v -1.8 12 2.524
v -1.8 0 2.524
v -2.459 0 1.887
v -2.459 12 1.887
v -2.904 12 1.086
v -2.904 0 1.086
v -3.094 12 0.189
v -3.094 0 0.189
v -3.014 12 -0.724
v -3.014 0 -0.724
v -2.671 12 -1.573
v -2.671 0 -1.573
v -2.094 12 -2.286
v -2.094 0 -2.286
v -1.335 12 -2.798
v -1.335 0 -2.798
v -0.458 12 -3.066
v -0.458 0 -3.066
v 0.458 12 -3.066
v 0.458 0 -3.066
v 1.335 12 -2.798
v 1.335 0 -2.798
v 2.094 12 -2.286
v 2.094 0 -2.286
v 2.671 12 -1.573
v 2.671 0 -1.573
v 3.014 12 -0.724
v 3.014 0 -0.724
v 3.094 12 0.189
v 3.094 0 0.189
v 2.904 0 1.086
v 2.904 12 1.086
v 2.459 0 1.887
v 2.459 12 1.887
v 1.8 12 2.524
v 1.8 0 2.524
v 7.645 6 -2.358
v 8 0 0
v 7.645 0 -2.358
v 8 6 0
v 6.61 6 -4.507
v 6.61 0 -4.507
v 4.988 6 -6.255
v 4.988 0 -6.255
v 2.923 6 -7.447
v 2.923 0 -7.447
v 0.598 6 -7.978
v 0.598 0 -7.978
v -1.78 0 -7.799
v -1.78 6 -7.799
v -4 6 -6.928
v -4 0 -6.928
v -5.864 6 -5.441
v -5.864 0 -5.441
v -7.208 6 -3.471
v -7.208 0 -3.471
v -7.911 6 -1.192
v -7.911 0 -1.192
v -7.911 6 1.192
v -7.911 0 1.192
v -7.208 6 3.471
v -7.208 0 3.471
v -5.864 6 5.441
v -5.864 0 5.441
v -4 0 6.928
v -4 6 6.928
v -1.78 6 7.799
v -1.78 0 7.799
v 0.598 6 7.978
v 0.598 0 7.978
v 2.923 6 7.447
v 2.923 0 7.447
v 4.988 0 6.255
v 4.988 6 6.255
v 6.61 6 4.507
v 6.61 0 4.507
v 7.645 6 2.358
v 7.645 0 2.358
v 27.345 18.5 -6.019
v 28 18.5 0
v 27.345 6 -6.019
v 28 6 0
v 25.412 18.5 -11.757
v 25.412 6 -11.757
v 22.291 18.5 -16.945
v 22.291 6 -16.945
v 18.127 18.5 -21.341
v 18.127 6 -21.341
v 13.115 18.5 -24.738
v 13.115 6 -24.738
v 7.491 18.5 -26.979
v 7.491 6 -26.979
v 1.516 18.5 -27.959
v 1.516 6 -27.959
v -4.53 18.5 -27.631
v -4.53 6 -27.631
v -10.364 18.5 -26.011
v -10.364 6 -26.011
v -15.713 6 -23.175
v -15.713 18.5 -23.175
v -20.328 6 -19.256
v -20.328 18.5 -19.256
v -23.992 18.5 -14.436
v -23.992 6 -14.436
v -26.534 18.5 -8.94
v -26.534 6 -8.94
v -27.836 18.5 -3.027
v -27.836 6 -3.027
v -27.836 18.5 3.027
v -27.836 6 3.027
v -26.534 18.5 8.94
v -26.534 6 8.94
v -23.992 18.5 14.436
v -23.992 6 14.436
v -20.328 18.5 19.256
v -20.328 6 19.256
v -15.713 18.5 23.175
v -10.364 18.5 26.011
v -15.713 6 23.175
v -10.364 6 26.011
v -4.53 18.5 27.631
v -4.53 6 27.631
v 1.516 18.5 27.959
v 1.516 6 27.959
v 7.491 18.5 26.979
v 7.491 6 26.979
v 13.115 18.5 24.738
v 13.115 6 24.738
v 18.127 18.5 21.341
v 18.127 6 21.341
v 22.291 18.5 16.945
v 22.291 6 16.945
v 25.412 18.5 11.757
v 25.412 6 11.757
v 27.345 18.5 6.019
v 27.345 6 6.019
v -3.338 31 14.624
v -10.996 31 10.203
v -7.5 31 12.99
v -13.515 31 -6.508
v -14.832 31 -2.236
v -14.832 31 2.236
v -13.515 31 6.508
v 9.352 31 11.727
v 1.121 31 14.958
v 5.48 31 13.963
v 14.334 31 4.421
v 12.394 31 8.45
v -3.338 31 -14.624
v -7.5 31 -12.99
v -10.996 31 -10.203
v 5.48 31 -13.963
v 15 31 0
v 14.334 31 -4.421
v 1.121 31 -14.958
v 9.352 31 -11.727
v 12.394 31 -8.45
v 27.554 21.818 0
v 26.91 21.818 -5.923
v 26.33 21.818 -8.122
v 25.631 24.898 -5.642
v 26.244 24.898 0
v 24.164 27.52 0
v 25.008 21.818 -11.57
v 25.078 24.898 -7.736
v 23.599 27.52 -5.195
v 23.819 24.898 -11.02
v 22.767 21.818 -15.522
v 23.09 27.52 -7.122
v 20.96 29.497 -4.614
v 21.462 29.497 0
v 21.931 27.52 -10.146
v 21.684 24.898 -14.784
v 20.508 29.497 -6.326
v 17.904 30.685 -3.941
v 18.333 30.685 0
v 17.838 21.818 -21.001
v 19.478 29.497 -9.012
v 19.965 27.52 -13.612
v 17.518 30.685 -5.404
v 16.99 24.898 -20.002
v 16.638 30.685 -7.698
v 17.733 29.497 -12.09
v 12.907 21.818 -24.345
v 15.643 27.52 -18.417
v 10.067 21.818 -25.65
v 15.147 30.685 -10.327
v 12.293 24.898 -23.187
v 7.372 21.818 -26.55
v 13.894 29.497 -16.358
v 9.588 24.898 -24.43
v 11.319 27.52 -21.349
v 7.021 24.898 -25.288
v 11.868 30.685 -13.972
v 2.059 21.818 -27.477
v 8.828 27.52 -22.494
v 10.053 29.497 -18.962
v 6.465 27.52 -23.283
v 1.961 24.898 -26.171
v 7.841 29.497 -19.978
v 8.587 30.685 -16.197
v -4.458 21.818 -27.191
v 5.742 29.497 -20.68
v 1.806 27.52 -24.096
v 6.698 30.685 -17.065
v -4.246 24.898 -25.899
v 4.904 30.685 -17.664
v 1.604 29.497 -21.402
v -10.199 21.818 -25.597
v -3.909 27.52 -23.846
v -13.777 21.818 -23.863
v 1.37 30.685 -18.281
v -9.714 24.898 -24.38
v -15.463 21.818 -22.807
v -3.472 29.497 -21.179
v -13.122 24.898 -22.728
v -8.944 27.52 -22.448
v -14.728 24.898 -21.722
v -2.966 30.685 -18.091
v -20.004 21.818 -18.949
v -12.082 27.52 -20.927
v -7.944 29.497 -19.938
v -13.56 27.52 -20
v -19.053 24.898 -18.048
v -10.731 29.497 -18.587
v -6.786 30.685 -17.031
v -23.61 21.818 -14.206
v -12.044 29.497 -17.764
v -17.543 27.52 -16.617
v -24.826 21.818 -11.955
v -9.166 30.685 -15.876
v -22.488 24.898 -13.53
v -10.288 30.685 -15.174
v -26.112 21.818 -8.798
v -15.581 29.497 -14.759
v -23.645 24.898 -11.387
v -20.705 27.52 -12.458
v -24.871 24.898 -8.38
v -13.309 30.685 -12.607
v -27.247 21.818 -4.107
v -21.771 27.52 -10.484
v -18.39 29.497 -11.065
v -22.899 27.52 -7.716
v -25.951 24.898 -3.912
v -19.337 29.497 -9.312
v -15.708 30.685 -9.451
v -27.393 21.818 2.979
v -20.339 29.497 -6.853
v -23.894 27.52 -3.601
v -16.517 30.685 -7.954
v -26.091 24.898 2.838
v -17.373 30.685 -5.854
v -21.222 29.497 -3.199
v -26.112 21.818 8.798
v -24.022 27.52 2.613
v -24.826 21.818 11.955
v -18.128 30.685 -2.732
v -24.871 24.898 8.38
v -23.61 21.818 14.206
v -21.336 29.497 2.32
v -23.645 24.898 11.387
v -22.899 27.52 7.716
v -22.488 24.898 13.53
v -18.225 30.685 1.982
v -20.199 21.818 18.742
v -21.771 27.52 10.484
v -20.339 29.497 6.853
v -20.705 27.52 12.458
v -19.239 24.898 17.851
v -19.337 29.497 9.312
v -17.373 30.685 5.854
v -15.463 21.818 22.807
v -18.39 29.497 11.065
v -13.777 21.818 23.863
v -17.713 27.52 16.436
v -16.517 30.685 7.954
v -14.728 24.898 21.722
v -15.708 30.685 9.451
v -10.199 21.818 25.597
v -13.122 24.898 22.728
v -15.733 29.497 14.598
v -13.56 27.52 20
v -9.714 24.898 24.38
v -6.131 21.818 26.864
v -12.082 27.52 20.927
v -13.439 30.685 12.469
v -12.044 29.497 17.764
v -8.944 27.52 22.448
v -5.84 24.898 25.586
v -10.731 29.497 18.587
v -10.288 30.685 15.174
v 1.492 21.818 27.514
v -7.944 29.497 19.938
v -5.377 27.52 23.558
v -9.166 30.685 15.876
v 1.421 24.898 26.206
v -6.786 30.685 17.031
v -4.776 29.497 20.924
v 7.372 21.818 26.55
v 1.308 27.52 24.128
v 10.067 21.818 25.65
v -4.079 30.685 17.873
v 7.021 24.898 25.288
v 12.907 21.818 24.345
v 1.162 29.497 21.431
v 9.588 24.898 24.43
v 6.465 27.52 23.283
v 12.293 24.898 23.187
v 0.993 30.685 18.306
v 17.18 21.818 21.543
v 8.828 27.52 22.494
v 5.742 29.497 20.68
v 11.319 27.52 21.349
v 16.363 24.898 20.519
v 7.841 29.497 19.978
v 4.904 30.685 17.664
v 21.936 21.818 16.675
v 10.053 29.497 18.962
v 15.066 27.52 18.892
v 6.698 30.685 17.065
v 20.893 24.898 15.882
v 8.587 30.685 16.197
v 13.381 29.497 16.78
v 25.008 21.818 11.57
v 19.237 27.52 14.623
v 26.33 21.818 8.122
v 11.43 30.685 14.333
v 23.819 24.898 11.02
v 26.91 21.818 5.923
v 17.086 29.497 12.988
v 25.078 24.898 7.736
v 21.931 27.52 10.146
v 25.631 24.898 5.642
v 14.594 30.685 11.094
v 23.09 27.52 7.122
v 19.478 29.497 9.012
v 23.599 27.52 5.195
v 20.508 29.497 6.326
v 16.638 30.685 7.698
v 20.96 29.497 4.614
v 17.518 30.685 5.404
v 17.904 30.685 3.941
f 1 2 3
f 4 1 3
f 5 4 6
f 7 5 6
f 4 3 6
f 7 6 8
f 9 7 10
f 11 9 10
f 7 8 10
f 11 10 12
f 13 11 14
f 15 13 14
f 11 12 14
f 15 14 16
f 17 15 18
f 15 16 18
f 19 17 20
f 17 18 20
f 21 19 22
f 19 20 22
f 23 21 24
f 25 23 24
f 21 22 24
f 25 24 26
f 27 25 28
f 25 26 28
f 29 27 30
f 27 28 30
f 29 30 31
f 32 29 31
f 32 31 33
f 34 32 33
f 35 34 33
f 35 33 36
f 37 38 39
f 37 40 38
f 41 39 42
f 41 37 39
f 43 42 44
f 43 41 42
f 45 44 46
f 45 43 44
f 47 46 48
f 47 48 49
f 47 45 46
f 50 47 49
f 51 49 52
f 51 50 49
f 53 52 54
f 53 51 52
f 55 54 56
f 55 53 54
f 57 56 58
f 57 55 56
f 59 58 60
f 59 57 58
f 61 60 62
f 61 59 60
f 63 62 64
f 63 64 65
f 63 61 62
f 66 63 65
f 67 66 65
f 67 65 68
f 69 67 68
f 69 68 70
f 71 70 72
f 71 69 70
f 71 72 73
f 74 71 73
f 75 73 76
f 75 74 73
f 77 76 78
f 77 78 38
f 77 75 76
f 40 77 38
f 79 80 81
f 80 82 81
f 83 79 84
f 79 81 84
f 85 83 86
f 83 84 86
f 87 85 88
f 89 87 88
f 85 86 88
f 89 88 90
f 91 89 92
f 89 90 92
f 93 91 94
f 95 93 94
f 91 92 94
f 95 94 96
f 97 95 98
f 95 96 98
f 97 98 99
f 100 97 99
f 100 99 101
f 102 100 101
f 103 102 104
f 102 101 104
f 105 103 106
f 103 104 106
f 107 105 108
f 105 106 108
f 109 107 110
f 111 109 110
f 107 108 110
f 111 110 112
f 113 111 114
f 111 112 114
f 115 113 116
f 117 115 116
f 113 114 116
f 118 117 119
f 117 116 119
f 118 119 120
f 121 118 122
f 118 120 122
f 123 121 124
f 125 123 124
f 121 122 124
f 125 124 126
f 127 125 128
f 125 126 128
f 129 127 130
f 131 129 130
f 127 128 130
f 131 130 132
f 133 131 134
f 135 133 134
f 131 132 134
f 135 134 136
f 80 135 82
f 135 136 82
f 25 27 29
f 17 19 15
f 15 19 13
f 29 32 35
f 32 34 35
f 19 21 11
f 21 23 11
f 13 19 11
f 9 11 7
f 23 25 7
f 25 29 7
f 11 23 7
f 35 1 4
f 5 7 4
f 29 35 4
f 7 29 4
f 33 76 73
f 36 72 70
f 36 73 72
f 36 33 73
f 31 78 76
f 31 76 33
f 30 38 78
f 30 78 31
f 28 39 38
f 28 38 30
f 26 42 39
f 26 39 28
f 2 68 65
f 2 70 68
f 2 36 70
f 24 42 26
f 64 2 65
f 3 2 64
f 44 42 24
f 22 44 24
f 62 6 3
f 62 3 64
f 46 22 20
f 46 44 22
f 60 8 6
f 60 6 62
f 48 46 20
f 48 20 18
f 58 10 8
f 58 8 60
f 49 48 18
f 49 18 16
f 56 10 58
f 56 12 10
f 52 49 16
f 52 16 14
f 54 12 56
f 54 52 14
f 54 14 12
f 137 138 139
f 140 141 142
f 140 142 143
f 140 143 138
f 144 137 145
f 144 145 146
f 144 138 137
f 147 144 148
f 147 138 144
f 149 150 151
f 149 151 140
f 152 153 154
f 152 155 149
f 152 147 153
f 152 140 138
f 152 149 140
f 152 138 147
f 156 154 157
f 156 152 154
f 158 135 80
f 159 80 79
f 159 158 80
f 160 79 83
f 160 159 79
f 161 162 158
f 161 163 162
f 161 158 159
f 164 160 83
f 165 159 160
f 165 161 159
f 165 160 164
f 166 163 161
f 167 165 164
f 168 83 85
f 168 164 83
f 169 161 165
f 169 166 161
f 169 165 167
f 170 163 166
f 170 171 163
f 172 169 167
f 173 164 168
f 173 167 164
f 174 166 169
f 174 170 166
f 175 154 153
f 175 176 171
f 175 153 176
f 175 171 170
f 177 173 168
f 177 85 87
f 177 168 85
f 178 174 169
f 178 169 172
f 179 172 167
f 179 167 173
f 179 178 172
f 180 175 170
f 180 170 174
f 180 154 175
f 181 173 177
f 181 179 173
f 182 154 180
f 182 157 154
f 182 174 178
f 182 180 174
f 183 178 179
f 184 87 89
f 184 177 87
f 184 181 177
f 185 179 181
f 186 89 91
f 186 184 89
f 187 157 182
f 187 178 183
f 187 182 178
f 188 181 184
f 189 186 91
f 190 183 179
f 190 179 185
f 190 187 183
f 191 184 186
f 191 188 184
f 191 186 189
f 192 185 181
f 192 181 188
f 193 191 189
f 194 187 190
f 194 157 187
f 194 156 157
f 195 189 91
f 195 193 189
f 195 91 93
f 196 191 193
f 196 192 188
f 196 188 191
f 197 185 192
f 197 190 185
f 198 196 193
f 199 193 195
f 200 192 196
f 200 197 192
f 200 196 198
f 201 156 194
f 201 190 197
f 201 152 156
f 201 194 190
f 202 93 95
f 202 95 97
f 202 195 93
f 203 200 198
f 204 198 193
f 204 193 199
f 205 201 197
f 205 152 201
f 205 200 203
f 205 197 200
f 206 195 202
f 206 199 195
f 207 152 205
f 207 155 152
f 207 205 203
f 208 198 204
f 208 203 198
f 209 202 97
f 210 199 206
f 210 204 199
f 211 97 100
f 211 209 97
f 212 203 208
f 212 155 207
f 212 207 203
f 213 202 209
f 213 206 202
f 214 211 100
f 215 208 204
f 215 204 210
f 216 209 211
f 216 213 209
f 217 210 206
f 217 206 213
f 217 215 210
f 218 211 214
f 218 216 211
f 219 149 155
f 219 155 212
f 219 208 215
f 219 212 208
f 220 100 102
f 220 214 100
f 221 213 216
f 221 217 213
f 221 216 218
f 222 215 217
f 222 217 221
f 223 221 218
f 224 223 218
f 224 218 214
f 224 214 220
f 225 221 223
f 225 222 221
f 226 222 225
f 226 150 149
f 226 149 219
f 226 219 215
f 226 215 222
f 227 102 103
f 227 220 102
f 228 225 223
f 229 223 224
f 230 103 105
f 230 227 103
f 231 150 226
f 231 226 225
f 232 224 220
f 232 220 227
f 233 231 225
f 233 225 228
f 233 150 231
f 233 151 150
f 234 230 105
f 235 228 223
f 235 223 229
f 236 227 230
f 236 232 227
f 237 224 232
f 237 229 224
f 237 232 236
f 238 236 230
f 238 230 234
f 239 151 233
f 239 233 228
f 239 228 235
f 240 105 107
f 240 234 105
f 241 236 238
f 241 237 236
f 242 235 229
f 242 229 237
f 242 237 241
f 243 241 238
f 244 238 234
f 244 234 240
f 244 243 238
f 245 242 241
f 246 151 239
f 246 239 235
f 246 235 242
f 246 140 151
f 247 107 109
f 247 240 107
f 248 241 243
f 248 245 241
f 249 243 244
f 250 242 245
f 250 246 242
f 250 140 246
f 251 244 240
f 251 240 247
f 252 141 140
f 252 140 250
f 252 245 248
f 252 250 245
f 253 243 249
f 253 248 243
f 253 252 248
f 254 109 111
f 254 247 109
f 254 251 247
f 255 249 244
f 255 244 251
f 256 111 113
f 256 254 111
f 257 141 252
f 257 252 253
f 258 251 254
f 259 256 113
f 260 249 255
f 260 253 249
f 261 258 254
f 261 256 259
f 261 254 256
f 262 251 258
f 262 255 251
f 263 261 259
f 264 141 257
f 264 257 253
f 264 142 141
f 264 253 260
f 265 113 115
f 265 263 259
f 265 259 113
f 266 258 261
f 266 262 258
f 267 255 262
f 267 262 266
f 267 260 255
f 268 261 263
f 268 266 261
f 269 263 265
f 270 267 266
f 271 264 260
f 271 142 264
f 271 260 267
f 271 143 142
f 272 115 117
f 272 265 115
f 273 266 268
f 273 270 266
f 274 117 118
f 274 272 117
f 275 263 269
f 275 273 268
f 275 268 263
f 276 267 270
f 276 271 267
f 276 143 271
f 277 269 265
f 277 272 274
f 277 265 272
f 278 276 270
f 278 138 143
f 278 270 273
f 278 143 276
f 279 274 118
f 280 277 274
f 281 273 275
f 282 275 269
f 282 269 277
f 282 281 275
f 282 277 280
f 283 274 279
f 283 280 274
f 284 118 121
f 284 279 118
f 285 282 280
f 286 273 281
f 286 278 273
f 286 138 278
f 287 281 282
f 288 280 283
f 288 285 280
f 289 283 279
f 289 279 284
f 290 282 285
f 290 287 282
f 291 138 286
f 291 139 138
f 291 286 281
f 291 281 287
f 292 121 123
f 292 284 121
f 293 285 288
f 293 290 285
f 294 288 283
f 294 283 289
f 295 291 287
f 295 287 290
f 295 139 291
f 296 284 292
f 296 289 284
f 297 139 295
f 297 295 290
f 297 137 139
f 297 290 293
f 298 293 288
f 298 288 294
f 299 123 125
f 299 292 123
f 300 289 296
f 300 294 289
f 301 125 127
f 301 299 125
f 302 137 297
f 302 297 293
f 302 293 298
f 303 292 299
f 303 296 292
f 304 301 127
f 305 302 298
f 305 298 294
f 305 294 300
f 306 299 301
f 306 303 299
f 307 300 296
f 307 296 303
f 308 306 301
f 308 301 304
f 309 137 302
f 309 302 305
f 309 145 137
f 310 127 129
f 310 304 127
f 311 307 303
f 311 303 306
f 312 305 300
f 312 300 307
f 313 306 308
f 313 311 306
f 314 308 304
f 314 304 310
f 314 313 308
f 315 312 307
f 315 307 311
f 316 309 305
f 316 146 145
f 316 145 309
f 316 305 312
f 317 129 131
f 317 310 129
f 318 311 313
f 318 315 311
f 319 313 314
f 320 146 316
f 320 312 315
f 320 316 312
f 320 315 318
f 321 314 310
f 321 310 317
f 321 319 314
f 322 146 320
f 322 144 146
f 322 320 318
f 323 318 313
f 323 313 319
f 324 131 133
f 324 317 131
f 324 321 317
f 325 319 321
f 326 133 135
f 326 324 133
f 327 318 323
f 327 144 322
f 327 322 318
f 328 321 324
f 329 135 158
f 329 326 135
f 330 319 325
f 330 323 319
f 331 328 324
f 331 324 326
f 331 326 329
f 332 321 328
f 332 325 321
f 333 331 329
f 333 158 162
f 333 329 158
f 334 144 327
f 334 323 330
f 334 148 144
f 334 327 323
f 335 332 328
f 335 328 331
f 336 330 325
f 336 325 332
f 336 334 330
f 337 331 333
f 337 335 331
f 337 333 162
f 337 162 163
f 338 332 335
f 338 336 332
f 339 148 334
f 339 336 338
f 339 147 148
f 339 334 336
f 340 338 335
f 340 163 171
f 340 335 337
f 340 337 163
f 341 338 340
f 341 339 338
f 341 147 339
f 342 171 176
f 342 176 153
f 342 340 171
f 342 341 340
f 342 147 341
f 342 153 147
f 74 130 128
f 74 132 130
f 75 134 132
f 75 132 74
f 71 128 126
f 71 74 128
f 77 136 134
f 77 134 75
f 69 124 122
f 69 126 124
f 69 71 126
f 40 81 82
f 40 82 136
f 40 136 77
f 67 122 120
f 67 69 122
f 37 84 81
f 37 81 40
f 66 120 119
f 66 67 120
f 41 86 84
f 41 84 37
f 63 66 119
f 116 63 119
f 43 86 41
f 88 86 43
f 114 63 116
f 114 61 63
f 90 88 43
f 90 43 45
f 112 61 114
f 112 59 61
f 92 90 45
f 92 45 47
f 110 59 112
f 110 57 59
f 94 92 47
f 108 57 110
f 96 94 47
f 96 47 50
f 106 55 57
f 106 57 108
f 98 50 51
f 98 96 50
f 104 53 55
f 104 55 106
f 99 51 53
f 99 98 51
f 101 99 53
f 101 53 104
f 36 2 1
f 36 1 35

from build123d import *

# Parameters (mm, degrees)
POCKET_DEPTH = 12


with BuildPart() as part:
    # Sketch → Revolution (revolve)
    with BuildSketch(Plane.XY):
        with BuildLine():
            Line((15, 31), (0, 31))
            Line((0, 31), (0, 0))
            Line((0, 0), (8, 0))
            Line((8, 0), (8, 6))
            Line((8, 6), (28, 6))
            Line((28, 18.5), (28, 6))
            ThreePointArc((28, 18.5), (24.163863, 27.520417), (15, 31))
        make_face()
    revolve(axis=Axis((0, 0, 0), (0, 1, 0)))

    # Sketch001 → Pocket (cut)
    with BuildSketch(Plane.XZ):
        with BuildLine():
            Line((-1.8, 2.523886), (1.8, 2.523886))
            ThreePointArc((-1.8, 2.523886), (0, -3.1), (1.8, 2.523886))
        make_face()
    extrude(amount=-POCKET_DEPTH, mode=Mode.SUBTRACT)


solid = part.part
